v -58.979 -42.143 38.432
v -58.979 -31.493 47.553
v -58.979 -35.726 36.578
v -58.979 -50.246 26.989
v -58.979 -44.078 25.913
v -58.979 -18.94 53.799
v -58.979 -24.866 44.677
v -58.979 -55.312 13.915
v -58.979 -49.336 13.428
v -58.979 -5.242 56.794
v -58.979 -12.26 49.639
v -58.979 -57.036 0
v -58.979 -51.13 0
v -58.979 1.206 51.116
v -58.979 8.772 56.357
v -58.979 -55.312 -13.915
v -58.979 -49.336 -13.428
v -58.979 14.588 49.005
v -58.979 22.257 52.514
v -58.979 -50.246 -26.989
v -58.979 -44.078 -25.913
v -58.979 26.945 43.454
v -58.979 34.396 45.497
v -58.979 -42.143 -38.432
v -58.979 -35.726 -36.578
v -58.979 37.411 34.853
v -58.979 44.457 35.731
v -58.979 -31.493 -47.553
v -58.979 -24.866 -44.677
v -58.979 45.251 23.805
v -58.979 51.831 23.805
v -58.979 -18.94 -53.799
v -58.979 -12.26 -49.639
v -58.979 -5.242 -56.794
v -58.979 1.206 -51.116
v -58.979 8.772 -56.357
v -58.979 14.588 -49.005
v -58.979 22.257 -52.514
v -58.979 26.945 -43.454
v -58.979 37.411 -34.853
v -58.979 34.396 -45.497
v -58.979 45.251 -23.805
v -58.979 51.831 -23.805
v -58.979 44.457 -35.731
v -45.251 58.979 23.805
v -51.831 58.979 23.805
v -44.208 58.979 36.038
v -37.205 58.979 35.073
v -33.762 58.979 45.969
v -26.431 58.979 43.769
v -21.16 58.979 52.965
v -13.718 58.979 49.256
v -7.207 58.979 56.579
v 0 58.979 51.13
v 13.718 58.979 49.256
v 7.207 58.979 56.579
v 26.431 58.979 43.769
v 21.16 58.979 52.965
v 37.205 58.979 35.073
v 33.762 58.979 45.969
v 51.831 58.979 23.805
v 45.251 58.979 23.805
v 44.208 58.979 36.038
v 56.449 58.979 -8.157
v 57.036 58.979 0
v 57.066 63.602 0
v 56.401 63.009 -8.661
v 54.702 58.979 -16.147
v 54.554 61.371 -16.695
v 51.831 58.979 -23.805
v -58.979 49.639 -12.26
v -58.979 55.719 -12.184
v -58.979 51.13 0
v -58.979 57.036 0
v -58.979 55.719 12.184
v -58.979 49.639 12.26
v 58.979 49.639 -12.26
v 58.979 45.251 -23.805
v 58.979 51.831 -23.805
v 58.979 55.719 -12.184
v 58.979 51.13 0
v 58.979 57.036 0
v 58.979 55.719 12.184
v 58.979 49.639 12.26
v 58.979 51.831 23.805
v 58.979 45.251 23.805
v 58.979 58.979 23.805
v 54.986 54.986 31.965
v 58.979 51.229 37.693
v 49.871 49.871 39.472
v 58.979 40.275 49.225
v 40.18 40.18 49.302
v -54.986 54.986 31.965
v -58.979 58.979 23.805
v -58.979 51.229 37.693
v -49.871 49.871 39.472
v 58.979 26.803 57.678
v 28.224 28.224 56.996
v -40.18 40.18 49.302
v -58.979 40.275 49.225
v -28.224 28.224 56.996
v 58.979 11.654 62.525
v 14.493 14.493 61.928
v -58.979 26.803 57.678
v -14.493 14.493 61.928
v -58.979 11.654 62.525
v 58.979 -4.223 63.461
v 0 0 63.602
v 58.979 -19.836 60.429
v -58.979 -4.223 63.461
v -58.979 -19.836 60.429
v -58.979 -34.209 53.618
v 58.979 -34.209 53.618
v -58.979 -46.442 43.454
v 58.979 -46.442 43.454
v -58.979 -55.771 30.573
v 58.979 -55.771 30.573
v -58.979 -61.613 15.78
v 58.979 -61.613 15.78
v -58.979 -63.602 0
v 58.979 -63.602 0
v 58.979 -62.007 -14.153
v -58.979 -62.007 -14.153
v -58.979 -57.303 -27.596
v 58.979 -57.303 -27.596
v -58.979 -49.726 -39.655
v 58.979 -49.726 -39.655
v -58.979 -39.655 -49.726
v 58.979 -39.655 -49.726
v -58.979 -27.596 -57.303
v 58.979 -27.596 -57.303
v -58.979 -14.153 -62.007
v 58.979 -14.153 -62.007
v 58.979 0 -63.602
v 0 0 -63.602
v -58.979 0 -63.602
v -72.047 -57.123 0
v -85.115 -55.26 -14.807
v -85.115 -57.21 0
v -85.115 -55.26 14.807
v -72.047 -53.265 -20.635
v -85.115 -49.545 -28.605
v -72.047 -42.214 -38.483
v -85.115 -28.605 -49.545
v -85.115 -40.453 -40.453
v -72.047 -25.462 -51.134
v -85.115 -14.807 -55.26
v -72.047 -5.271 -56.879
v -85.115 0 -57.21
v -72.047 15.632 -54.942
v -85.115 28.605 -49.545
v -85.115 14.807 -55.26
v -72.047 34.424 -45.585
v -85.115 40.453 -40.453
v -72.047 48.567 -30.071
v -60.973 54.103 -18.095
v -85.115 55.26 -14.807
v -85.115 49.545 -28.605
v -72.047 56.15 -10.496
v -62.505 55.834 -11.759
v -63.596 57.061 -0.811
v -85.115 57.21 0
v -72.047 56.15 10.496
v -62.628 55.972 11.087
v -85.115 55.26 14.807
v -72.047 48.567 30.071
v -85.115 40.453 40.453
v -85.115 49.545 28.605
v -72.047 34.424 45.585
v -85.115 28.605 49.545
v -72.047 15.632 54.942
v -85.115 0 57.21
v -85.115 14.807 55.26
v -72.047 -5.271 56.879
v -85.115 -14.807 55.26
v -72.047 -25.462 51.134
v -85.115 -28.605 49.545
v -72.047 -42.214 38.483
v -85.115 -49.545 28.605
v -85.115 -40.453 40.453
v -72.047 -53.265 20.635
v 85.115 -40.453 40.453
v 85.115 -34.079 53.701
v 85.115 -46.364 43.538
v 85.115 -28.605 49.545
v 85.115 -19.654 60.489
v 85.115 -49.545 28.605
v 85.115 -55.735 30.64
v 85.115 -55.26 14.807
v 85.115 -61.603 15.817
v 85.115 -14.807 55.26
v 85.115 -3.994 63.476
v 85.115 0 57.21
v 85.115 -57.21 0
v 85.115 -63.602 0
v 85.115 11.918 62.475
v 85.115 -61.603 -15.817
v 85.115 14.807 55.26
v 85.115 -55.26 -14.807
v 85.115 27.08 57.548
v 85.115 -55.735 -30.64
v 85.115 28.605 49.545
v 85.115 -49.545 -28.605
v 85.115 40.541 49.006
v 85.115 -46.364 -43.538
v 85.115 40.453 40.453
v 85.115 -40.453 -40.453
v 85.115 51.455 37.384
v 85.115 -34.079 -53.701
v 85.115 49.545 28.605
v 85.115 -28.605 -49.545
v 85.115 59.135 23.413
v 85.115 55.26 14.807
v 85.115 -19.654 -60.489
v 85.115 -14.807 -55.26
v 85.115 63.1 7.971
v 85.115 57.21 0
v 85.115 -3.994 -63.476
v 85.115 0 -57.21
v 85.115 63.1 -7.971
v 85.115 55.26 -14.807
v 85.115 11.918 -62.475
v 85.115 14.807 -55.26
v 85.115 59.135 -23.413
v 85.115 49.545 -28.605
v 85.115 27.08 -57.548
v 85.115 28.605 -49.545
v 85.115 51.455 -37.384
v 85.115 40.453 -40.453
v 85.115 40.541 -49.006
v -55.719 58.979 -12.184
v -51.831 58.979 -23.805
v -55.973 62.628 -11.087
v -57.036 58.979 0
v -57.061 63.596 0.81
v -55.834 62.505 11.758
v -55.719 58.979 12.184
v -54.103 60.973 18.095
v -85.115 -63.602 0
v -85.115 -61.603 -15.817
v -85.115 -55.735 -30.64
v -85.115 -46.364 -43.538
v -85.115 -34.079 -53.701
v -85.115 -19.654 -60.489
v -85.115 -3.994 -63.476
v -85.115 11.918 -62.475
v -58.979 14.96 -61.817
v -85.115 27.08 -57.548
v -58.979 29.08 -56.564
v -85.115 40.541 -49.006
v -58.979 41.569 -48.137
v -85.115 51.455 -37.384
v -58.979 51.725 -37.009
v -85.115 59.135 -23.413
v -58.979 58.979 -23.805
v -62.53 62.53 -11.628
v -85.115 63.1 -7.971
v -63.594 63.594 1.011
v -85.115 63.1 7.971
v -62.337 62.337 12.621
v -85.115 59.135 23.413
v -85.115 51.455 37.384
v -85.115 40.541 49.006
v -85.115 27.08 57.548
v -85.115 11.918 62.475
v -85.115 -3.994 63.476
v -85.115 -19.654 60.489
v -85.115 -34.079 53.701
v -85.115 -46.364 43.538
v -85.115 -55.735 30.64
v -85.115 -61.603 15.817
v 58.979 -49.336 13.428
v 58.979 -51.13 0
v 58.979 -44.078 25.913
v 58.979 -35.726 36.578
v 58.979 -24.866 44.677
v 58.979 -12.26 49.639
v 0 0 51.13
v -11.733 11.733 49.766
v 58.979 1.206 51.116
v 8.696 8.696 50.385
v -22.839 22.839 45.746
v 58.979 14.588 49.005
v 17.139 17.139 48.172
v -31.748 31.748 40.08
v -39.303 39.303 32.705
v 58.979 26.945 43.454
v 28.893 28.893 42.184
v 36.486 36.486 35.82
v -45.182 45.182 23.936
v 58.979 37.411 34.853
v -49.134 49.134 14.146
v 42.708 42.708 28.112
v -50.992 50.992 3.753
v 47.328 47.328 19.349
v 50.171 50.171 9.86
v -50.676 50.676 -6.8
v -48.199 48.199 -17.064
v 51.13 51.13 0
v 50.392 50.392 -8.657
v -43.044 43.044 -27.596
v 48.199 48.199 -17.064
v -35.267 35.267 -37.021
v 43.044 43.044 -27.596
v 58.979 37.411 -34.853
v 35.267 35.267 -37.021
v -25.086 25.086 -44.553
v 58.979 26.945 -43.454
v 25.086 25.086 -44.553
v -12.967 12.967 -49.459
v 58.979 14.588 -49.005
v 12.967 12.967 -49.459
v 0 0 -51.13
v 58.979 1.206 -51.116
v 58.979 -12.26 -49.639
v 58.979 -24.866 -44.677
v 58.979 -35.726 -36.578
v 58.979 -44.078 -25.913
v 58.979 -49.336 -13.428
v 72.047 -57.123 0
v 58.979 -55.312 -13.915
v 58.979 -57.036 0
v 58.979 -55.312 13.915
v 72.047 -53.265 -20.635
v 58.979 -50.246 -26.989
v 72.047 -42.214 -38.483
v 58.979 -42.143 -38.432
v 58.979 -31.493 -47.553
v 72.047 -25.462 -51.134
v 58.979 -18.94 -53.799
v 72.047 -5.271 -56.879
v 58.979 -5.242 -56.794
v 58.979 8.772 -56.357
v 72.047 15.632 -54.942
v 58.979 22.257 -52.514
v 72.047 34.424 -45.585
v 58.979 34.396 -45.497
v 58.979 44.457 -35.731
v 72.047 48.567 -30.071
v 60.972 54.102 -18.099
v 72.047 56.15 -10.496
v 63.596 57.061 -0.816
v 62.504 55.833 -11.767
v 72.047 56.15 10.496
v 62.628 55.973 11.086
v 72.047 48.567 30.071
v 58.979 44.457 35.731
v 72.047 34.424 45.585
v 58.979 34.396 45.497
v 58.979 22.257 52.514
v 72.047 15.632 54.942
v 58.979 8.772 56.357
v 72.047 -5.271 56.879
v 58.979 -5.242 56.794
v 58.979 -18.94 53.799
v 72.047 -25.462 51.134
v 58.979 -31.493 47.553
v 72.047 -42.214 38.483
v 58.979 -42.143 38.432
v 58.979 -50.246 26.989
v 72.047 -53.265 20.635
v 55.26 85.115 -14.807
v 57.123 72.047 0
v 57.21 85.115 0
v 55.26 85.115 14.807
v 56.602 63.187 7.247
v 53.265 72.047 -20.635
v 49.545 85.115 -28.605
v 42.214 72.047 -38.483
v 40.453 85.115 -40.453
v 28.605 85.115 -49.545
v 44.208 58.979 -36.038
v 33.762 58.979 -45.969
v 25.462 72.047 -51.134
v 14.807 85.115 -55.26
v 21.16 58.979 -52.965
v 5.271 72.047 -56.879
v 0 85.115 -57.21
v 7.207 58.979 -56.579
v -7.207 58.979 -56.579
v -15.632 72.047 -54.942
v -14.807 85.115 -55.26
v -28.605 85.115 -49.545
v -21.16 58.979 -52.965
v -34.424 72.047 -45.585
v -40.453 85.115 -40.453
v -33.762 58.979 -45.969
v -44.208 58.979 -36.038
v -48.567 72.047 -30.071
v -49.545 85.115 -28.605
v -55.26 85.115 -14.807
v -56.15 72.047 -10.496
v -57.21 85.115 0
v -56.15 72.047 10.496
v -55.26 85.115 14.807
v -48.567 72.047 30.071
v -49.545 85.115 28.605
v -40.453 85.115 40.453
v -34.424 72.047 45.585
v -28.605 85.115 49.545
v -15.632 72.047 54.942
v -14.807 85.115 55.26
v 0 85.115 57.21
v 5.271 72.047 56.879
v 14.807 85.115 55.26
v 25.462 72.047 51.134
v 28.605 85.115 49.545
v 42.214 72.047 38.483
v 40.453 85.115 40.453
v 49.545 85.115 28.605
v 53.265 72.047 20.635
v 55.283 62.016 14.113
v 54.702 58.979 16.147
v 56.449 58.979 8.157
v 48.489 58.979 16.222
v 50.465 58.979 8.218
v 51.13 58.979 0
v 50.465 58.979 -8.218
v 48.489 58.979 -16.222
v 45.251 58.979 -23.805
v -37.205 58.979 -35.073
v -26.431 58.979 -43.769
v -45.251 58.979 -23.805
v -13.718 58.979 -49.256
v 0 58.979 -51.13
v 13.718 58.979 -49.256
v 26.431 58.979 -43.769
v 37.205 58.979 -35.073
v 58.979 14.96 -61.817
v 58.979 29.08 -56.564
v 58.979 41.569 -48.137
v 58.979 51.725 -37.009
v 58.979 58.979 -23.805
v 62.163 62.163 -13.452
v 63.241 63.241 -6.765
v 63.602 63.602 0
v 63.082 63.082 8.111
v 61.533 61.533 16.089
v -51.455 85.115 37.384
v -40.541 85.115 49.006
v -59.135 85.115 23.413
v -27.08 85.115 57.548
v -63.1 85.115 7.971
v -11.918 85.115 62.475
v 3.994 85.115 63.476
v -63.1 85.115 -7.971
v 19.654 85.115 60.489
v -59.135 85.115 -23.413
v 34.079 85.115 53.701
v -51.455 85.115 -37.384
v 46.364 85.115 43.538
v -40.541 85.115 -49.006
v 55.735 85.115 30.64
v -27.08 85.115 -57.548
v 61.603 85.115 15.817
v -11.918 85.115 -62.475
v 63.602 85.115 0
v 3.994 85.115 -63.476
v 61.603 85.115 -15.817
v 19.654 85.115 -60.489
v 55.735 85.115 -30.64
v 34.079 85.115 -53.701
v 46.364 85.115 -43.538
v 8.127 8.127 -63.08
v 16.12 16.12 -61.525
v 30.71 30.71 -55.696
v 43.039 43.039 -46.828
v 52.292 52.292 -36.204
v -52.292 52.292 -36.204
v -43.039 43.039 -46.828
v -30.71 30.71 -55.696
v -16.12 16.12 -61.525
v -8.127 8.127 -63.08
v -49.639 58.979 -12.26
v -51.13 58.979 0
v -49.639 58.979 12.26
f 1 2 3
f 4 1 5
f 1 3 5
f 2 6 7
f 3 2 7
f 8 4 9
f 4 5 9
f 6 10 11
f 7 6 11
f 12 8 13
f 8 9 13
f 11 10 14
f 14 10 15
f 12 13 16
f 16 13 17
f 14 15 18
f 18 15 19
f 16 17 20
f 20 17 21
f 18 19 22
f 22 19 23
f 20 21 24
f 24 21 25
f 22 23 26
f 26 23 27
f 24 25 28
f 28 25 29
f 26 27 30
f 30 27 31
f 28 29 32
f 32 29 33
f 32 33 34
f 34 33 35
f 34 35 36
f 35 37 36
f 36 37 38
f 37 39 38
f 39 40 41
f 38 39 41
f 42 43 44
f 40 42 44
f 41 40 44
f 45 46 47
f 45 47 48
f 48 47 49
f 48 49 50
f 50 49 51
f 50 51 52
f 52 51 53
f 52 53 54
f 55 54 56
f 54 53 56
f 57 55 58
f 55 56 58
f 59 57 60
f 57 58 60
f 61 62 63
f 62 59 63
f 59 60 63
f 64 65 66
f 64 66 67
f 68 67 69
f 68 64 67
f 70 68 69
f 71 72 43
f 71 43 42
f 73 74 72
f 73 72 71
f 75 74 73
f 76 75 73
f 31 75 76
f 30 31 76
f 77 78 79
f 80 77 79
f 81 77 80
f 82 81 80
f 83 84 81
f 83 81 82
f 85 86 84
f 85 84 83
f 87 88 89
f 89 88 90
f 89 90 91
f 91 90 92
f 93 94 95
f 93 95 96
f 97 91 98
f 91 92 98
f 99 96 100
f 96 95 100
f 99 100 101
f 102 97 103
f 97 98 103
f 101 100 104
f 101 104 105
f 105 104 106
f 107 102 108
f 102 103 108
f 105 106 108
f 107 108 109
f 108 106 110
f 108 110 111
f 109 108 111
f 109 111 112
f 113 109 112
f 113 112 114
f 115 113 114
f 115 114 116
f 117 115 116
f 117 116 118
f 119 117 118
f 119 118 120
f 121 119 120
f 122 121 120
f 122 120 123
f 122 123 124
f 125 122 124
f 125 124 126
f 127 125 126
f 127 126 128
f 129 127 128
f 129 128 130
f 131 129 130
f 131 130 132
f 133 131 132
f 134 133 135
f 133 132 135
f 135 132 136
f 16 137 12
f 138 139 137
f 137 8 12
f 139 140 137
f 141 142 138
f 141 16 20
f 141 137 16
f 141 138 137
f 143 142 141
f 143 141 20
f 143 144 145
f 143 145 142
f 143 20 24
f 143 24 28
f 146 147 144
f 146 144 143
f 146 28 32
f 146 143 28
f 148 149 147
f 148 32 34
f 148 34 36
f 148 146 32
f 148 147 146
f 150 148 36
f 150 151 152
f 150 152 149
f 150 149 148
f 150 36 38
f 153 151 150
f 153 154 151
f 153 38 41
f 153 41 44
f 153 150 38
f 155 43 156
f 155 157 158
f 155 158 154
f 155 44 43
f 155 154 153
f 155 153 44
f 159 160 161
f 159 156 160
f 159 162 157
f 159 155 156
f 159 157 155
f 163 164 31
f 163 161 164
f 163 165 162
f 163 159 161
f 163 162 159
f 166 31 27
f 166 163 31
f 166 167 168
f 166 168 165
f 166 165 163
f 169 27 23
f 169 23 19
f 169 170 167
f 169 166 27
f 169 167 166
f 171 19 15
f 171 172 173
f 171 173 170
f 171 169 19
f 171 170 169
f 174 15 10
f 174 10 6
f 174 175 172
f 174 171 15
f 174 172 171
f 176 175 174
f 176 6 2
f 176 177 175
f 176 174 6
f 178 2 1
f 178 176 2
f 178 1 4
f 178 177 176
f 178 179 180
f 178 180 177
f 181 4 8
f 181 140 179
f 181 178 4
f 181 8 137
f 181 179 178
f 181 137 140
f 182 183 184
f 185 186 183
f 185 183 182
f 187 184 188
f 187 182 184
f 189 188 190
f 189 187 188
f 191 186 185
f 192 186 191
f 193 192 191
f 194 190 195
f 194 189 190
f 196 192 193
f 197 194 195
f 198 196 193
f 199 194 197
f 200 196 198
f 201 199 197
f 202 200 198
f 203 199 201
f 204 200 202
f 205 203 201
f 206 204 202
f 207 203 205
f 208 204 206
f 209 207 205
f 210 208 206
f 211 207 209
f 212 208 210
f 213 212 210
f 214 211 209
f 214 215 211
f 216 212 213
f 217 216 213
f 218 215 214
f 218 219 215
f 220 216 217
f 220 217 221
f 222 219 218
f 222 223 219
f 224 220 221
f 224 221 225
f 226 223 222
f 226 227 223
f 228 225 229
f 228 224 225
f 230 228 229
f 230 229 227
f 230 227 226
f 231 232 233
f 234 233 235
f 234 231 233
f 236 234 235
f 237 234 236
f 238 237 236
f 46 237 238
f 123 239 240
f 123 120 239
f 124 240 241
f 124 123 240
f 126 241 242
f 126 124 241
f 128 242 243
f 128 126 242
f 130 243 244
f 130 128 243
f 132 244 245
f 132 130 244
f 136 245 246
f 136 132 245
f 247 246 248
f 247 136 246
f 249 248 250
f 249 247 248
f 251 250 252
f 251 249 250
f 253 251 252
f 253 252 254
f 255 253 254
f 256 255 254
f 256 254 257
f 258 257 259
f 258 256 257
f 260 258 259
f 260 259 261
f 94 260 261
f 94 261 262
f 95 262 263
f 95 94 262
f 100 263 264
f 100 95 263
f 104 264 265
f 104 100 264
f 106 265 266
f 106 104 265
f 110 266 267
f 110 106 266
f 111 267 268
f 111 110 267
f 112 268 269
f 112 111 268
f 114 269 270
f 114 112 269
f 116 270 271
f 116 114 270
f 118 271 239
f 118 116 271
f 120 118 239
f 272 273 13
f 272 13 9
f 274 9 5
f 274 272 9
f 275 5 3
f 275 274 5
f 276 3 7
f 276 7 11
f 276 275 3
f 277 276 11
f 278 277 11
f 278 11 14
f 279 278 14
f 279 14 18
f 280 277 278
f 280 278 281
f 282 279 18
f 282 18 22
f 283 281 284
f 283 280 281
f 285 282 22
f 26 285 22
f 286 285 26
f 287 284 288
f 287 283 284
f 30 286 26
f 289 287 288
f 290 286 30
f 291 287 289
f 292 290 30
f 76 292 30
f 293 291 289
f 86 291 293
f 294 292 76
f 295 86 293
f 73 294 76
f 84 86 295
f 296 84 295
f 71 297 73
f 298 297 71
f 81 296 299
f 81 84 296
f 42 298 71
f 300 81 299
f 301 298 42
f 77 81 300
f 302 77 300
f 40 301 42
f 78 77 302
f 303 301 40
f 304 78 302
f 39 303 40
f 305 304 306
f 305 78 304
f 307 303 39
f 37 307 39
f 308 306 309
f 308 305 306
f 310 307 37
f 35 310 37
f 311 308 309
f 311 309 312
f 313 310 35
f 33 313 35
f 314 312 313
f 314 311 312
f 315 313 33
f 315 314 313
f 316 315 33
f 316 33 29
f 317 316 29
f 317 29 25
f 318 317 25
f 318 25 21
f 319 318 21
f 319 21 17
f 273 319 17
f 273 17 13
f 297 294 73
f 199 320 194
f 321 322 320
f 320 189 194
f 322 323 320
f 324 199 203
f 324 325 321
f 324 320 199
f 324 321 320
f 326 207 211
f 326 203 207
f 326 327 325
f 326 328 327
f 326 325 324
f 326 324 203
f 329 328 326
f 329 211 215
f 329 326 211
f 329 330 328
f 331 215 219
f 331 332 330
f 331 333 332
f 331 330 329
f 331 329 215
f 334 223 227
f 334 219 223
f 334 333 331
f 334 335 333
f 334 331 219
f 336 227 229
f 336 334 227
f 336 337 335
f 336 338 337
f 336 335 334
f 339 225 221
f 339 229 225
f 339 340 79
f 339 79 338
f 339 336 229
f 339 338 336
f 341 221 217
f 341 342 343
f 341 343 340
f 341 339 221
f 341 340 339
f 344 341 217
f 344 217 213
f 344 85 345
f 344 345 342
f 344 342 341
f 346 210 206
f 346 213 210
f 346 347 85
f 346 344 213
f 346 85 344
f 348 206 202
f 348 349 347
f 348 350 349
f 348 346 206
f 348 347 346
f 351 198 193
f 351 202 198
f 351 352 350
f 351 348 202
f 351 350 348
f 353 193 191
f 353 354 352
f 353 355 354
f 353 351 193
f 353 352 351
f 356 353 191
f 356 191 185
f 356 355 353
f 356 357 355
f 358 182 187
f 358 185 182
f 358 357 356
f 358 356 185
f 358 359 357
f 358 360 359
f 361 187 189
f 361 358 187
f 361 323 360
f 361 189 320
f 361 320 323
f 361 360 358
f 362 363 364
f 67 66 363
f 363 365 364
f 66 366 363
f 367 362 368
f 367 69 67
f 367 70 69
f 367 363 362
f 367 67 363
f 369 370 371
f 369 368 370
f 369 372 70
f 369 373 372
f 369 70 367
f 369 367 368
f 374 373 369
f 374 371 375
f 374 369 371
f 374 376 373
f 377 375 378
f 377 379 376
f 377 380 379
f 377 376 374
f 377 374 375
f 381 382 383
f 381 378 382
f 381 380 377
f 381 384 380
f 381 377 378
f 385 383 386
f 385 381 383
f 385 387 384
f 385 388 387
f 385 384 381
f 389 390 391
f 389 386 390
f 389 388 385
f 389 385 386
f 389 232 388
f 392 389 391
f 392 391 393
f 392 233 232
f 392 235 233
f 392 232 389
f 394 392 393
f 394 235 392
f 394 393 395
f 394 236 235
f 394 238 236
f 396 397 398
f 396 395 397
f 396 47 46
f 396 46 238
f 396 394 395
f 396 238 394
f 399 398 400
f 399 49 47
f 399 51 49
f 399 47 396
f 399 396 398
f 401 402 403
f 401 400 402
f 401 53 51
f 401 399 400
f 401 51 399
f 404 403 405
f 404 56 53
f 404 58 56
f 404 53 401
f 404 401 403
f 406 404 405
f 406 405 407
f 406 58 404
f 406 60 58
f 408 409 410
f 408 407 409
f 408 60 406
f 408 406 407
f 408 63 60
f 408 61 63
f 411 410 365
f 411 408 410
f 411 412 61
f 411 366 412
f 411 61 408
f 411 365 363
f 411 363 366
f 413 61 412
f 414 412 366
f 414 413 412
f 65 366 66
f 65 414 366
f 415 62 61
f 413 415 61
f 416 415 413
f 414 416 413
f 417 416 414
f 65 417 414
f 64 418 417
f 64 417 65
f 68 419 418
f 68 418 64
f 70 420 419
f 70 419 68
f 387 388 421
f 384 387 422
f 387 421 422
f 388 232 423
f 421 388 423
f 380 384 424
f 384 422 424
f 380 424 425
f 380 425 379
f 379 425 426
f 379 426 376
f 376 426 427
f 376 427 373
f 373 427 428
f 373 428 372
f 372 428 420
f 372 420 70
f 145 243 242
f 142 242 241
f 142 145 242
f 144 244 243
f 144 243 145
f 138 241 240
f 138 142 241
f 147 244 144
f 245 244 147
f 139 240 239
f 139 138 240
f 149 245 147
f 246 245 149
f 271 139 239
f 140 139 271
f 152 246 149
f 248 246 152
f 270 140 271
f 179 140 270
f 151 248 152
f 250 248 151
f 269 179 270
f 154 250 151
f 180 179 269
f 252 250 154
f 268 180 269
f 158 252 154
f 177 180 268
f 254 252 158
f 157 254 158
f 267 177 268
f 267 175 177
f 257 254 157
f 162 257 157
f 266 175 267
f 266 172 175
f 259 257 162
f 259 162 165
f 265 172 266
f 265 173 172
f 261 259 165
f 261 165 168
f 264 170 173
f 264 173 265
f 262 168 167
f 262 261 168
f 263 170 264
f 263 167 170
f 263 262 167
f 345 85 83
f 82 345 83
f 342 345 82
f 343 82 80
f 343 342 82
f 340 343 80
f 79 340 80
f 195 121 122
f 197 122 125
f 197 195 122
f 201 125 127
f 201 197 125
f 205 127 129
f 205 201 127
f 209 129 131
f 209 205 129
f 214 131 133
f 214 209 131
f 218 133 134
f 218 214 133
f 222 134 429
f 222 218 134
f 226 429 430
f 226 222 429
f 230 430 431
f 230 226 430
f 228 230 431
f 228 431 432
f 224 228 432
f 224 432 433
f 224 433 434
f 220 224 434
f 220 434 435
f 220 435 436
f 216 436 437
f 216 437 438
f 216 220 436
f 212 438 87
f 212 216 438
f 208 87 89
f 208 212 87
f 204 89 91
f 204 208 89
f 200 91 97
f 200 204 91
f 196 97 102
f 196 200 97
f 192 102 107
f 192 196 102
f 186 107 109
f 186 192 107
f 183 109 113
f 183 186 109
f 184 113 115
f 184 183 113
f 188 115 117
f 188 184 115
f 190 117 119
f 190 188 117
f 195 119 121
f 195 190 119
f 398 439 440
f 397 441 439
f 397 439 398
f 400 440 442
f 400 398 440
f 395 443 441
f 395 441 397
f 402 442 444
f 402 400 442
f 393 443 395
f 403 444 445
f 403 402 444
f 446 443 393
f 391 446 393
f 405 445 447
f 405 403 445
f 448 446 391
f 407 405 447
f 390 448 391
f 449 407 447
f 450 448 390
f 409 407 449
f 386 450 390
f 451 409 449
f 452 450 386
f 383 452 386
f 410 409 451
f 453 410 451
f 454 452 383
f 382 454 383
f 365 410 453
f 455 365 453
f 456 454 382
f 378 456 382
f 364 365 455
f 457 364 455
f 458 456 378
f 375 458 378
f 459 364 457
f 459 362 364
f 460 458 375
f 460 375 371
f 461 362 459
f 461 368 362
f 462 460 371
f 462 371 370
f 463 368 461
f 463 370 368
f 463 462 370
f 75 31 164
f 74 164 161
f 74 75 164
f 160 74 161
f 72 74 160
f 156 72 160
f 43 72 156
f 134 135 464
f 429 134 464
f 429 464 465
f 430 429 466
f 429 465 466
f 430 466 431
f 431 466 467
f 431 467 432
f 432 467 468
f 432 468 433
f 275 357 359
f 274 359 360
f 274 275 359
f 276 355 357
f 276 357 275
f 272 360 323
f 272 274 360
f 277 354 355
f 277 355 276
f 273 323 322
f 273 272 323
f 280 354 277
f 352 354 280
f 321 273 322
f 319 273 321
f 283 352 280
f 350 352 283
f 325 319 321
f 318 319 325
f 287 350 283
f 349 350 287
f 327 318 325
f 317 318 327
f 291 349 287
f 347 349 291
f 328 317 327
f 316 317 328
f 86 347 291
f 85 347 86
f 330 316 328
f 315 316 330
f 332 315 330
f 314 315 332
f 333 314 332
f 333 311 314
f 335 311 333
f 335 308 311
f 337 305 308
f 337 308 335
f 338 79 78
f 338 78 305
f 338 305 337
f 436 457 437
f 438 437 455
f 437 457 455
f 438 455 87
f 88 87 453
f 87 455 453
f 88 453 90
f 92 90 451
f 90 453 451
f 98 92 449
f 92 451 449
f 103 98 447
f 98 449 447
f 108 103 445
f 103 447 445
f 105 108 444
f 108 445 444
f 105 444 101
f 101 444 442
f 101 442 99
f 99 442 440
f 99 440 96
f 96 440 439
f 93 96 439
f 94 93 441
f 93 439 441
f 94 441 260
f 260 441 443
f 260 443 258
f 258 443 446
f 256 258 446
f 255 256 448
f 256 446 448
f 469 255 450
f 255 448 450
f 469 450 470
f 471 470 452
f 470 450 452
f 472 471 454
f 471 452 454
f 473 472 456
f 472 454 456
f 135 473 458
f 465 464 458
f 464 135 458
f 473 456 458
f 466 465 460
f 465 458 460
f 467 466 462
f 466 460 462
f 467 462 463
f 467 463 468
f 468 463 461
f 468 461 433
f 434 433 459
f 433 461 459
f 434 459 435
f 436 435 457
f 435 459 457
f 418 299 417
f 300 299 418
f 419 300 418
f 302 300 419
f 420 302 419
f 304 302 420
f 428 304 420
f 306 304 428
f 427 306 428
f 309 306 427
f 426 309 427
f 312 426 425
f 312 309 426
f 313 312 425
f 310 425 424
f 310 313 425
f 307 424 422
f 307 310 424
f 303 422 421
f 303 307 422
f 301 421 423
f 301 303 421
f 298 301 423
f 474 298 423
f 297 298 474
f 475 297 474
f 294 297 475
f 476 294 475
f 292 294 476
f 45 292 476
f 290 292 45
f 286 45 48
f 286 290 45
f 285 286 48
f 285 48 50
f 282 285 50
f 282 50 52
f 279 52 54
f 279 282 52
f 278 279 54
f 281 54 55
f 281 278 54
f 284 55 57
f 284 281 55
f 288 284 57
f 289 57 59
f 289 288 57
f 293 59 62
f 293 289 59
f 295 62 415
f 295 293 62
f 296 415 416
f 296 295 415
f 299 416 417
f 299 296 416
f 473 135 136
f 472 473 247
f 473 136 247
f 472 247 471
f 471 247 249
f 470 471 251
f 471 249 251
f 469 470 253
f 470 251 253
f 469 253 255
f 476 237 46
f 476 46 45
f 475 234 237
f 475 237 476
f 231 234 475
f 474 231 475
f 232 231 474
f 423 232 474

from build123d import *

# Parameters (mm, degrees)
SKETCH4_R           = 63.6016
BOSS_EXTRUDE1_DEPTH = 117.9576
SKETCH5_R           = 63.6016
BOSS_EXTRUDE2_DEPTH = 58.9788
SKETCH8_R           = 63.6016
SKETCH8_R_2         = 47.397505823
CUT_EXTRUDE1_DEPTH  = 25.4
SKETCH9_R           = 79.726534617
SKETCH9_R_2         = 24.880704632
CUT_EXTRUDE2_DEPTH  = 25.4
SKETCH10_R          = 82.836499496
SKETCH10_R_2        = 21.967276082
CUT_EXTRUDE3_DEPTH  = 25.4


with BuildPart() as part:
    # Sketch1 → Revolve1 (revolve)
    with BuildSketch(Plane.XY):
        Polygon((-110.5154, -63.6016), (-58.9788, -63.6016), (-58.9788, -57.0357), (-110.5154, -57.3786), align=None)
        Polygon((110.5154, -57.3786), (58.9788, -57.0357), (58.9788, -63.6016), (110.5154, -63.6016), align=None)
    revolve(axis=Axis((-110.5154, 0, 0), (1, 0, 0)))



with BuildPart() as body_2:
    # Sketch2 → Revolve2 (revolve)
    with BuildSketch(Plane.XY):
        Polygon((57.3786, 110.5154), (57.0357, 58.9788), (63.6016, 58.9788), (63.6016, 110.5154), align=None)
    revolve(axis=Axis((0, 0, 0), (0, 1, 0)))


with BuildPart() as part_1:
    add(part.part)

    add(body_2.part)  # Boss-Extrude1 merges body 2
    # Sketch4 → Boss-Extrude1 (add)
    with BuildSketch(Plane(origin=(-58.9788, 0, 0), x_dir=(0, 0, -1), z_dir=(1, 0, 0))):
        Circle(SKETCH4_R)
    extrude(amount=BOSS_EXTRUDE1_DEPTH)

    # Sketch5 → Boss-Extrude2 (add)
    with BuildSketch(Plane.XZ.offset(-58.9788)):
        Circle(SKETCH5_R)
    extrude(amount=BOSS_EXTRUDE2_DEPTH)

    # Sketch6 → Cut-Revolve1 (revolve, cut)
    with BuildSketch(Plane.XY):
        Polygon((-110.5154, -57.3786), (-58.9788, -57.0357), (-58.9788, -51.1302), (58.9788, -51.1302), (58.9788, -57.0357), (110.5154, -57.3786), (110.5154, 0), (-110.5154, 0), align=None)
    revolve(axis=Axis((110.5154, 0, 0), (-1, 0, 0)), mode=Mode.SUBTRACT)

    # Sketch7 → Cut-Revolve2 (revolve, cut)
    with BuildSketch(Plane.XY):
        Polygon((57.3786, 110.5154), (57.0357, 58.9788), (51.1302, 58.9788), (51.1302, 0), (0, 0), (0, 110.5154), align=None)
    revolve(axis=Axis((0, 0, 0), (0, 1, 0)), mode=Mode.SUBTRACT)

    # Sketch8 → Cut-Extrude1 (cut)
    with BuildSketch(Plane(origin=(0, 110.5154, 0), x_dir=(1, 0, 0), z_dir=(0, 1, 0))):
        Circle(SKETCH8_R)
        Circle(SKETCH8_R_2, mode=Mode.SUBTRACT)
    extrude(amount=-CUT_EXTRUDE1_DEPTH, mode=Mode.SUBTRACT)

    # Sketch9 → Cut-Extrude2 (cut)
    with BuildSketch(Plane.ZY.offset(110.5154)):
        Circle(SKETCH9_R)
        Circle(SKETCH9_R_2, mode=Mode.SUBTRACT)
    extrude(amount=-CUT_EXTRUDE2_DEPTH, mode=Mode.SUBTRACT)

    # Sketch10 → Cut-Extrude3 (cut)
    with BuildSketch(Plane(origin=(110.5154, 0, 0), x_dir=(0, 0, -1), z_dir=(1, 0, 0))):
        Circle(SKETCH10_R)
        Circle(SKETCH10_R_2, mode=Mode.SUBTRACT)
    extrude(amount=-CUT_EXTRUDE3_DEPTH, mode=Mode.SUBTRACT)


solid = part_1.part
